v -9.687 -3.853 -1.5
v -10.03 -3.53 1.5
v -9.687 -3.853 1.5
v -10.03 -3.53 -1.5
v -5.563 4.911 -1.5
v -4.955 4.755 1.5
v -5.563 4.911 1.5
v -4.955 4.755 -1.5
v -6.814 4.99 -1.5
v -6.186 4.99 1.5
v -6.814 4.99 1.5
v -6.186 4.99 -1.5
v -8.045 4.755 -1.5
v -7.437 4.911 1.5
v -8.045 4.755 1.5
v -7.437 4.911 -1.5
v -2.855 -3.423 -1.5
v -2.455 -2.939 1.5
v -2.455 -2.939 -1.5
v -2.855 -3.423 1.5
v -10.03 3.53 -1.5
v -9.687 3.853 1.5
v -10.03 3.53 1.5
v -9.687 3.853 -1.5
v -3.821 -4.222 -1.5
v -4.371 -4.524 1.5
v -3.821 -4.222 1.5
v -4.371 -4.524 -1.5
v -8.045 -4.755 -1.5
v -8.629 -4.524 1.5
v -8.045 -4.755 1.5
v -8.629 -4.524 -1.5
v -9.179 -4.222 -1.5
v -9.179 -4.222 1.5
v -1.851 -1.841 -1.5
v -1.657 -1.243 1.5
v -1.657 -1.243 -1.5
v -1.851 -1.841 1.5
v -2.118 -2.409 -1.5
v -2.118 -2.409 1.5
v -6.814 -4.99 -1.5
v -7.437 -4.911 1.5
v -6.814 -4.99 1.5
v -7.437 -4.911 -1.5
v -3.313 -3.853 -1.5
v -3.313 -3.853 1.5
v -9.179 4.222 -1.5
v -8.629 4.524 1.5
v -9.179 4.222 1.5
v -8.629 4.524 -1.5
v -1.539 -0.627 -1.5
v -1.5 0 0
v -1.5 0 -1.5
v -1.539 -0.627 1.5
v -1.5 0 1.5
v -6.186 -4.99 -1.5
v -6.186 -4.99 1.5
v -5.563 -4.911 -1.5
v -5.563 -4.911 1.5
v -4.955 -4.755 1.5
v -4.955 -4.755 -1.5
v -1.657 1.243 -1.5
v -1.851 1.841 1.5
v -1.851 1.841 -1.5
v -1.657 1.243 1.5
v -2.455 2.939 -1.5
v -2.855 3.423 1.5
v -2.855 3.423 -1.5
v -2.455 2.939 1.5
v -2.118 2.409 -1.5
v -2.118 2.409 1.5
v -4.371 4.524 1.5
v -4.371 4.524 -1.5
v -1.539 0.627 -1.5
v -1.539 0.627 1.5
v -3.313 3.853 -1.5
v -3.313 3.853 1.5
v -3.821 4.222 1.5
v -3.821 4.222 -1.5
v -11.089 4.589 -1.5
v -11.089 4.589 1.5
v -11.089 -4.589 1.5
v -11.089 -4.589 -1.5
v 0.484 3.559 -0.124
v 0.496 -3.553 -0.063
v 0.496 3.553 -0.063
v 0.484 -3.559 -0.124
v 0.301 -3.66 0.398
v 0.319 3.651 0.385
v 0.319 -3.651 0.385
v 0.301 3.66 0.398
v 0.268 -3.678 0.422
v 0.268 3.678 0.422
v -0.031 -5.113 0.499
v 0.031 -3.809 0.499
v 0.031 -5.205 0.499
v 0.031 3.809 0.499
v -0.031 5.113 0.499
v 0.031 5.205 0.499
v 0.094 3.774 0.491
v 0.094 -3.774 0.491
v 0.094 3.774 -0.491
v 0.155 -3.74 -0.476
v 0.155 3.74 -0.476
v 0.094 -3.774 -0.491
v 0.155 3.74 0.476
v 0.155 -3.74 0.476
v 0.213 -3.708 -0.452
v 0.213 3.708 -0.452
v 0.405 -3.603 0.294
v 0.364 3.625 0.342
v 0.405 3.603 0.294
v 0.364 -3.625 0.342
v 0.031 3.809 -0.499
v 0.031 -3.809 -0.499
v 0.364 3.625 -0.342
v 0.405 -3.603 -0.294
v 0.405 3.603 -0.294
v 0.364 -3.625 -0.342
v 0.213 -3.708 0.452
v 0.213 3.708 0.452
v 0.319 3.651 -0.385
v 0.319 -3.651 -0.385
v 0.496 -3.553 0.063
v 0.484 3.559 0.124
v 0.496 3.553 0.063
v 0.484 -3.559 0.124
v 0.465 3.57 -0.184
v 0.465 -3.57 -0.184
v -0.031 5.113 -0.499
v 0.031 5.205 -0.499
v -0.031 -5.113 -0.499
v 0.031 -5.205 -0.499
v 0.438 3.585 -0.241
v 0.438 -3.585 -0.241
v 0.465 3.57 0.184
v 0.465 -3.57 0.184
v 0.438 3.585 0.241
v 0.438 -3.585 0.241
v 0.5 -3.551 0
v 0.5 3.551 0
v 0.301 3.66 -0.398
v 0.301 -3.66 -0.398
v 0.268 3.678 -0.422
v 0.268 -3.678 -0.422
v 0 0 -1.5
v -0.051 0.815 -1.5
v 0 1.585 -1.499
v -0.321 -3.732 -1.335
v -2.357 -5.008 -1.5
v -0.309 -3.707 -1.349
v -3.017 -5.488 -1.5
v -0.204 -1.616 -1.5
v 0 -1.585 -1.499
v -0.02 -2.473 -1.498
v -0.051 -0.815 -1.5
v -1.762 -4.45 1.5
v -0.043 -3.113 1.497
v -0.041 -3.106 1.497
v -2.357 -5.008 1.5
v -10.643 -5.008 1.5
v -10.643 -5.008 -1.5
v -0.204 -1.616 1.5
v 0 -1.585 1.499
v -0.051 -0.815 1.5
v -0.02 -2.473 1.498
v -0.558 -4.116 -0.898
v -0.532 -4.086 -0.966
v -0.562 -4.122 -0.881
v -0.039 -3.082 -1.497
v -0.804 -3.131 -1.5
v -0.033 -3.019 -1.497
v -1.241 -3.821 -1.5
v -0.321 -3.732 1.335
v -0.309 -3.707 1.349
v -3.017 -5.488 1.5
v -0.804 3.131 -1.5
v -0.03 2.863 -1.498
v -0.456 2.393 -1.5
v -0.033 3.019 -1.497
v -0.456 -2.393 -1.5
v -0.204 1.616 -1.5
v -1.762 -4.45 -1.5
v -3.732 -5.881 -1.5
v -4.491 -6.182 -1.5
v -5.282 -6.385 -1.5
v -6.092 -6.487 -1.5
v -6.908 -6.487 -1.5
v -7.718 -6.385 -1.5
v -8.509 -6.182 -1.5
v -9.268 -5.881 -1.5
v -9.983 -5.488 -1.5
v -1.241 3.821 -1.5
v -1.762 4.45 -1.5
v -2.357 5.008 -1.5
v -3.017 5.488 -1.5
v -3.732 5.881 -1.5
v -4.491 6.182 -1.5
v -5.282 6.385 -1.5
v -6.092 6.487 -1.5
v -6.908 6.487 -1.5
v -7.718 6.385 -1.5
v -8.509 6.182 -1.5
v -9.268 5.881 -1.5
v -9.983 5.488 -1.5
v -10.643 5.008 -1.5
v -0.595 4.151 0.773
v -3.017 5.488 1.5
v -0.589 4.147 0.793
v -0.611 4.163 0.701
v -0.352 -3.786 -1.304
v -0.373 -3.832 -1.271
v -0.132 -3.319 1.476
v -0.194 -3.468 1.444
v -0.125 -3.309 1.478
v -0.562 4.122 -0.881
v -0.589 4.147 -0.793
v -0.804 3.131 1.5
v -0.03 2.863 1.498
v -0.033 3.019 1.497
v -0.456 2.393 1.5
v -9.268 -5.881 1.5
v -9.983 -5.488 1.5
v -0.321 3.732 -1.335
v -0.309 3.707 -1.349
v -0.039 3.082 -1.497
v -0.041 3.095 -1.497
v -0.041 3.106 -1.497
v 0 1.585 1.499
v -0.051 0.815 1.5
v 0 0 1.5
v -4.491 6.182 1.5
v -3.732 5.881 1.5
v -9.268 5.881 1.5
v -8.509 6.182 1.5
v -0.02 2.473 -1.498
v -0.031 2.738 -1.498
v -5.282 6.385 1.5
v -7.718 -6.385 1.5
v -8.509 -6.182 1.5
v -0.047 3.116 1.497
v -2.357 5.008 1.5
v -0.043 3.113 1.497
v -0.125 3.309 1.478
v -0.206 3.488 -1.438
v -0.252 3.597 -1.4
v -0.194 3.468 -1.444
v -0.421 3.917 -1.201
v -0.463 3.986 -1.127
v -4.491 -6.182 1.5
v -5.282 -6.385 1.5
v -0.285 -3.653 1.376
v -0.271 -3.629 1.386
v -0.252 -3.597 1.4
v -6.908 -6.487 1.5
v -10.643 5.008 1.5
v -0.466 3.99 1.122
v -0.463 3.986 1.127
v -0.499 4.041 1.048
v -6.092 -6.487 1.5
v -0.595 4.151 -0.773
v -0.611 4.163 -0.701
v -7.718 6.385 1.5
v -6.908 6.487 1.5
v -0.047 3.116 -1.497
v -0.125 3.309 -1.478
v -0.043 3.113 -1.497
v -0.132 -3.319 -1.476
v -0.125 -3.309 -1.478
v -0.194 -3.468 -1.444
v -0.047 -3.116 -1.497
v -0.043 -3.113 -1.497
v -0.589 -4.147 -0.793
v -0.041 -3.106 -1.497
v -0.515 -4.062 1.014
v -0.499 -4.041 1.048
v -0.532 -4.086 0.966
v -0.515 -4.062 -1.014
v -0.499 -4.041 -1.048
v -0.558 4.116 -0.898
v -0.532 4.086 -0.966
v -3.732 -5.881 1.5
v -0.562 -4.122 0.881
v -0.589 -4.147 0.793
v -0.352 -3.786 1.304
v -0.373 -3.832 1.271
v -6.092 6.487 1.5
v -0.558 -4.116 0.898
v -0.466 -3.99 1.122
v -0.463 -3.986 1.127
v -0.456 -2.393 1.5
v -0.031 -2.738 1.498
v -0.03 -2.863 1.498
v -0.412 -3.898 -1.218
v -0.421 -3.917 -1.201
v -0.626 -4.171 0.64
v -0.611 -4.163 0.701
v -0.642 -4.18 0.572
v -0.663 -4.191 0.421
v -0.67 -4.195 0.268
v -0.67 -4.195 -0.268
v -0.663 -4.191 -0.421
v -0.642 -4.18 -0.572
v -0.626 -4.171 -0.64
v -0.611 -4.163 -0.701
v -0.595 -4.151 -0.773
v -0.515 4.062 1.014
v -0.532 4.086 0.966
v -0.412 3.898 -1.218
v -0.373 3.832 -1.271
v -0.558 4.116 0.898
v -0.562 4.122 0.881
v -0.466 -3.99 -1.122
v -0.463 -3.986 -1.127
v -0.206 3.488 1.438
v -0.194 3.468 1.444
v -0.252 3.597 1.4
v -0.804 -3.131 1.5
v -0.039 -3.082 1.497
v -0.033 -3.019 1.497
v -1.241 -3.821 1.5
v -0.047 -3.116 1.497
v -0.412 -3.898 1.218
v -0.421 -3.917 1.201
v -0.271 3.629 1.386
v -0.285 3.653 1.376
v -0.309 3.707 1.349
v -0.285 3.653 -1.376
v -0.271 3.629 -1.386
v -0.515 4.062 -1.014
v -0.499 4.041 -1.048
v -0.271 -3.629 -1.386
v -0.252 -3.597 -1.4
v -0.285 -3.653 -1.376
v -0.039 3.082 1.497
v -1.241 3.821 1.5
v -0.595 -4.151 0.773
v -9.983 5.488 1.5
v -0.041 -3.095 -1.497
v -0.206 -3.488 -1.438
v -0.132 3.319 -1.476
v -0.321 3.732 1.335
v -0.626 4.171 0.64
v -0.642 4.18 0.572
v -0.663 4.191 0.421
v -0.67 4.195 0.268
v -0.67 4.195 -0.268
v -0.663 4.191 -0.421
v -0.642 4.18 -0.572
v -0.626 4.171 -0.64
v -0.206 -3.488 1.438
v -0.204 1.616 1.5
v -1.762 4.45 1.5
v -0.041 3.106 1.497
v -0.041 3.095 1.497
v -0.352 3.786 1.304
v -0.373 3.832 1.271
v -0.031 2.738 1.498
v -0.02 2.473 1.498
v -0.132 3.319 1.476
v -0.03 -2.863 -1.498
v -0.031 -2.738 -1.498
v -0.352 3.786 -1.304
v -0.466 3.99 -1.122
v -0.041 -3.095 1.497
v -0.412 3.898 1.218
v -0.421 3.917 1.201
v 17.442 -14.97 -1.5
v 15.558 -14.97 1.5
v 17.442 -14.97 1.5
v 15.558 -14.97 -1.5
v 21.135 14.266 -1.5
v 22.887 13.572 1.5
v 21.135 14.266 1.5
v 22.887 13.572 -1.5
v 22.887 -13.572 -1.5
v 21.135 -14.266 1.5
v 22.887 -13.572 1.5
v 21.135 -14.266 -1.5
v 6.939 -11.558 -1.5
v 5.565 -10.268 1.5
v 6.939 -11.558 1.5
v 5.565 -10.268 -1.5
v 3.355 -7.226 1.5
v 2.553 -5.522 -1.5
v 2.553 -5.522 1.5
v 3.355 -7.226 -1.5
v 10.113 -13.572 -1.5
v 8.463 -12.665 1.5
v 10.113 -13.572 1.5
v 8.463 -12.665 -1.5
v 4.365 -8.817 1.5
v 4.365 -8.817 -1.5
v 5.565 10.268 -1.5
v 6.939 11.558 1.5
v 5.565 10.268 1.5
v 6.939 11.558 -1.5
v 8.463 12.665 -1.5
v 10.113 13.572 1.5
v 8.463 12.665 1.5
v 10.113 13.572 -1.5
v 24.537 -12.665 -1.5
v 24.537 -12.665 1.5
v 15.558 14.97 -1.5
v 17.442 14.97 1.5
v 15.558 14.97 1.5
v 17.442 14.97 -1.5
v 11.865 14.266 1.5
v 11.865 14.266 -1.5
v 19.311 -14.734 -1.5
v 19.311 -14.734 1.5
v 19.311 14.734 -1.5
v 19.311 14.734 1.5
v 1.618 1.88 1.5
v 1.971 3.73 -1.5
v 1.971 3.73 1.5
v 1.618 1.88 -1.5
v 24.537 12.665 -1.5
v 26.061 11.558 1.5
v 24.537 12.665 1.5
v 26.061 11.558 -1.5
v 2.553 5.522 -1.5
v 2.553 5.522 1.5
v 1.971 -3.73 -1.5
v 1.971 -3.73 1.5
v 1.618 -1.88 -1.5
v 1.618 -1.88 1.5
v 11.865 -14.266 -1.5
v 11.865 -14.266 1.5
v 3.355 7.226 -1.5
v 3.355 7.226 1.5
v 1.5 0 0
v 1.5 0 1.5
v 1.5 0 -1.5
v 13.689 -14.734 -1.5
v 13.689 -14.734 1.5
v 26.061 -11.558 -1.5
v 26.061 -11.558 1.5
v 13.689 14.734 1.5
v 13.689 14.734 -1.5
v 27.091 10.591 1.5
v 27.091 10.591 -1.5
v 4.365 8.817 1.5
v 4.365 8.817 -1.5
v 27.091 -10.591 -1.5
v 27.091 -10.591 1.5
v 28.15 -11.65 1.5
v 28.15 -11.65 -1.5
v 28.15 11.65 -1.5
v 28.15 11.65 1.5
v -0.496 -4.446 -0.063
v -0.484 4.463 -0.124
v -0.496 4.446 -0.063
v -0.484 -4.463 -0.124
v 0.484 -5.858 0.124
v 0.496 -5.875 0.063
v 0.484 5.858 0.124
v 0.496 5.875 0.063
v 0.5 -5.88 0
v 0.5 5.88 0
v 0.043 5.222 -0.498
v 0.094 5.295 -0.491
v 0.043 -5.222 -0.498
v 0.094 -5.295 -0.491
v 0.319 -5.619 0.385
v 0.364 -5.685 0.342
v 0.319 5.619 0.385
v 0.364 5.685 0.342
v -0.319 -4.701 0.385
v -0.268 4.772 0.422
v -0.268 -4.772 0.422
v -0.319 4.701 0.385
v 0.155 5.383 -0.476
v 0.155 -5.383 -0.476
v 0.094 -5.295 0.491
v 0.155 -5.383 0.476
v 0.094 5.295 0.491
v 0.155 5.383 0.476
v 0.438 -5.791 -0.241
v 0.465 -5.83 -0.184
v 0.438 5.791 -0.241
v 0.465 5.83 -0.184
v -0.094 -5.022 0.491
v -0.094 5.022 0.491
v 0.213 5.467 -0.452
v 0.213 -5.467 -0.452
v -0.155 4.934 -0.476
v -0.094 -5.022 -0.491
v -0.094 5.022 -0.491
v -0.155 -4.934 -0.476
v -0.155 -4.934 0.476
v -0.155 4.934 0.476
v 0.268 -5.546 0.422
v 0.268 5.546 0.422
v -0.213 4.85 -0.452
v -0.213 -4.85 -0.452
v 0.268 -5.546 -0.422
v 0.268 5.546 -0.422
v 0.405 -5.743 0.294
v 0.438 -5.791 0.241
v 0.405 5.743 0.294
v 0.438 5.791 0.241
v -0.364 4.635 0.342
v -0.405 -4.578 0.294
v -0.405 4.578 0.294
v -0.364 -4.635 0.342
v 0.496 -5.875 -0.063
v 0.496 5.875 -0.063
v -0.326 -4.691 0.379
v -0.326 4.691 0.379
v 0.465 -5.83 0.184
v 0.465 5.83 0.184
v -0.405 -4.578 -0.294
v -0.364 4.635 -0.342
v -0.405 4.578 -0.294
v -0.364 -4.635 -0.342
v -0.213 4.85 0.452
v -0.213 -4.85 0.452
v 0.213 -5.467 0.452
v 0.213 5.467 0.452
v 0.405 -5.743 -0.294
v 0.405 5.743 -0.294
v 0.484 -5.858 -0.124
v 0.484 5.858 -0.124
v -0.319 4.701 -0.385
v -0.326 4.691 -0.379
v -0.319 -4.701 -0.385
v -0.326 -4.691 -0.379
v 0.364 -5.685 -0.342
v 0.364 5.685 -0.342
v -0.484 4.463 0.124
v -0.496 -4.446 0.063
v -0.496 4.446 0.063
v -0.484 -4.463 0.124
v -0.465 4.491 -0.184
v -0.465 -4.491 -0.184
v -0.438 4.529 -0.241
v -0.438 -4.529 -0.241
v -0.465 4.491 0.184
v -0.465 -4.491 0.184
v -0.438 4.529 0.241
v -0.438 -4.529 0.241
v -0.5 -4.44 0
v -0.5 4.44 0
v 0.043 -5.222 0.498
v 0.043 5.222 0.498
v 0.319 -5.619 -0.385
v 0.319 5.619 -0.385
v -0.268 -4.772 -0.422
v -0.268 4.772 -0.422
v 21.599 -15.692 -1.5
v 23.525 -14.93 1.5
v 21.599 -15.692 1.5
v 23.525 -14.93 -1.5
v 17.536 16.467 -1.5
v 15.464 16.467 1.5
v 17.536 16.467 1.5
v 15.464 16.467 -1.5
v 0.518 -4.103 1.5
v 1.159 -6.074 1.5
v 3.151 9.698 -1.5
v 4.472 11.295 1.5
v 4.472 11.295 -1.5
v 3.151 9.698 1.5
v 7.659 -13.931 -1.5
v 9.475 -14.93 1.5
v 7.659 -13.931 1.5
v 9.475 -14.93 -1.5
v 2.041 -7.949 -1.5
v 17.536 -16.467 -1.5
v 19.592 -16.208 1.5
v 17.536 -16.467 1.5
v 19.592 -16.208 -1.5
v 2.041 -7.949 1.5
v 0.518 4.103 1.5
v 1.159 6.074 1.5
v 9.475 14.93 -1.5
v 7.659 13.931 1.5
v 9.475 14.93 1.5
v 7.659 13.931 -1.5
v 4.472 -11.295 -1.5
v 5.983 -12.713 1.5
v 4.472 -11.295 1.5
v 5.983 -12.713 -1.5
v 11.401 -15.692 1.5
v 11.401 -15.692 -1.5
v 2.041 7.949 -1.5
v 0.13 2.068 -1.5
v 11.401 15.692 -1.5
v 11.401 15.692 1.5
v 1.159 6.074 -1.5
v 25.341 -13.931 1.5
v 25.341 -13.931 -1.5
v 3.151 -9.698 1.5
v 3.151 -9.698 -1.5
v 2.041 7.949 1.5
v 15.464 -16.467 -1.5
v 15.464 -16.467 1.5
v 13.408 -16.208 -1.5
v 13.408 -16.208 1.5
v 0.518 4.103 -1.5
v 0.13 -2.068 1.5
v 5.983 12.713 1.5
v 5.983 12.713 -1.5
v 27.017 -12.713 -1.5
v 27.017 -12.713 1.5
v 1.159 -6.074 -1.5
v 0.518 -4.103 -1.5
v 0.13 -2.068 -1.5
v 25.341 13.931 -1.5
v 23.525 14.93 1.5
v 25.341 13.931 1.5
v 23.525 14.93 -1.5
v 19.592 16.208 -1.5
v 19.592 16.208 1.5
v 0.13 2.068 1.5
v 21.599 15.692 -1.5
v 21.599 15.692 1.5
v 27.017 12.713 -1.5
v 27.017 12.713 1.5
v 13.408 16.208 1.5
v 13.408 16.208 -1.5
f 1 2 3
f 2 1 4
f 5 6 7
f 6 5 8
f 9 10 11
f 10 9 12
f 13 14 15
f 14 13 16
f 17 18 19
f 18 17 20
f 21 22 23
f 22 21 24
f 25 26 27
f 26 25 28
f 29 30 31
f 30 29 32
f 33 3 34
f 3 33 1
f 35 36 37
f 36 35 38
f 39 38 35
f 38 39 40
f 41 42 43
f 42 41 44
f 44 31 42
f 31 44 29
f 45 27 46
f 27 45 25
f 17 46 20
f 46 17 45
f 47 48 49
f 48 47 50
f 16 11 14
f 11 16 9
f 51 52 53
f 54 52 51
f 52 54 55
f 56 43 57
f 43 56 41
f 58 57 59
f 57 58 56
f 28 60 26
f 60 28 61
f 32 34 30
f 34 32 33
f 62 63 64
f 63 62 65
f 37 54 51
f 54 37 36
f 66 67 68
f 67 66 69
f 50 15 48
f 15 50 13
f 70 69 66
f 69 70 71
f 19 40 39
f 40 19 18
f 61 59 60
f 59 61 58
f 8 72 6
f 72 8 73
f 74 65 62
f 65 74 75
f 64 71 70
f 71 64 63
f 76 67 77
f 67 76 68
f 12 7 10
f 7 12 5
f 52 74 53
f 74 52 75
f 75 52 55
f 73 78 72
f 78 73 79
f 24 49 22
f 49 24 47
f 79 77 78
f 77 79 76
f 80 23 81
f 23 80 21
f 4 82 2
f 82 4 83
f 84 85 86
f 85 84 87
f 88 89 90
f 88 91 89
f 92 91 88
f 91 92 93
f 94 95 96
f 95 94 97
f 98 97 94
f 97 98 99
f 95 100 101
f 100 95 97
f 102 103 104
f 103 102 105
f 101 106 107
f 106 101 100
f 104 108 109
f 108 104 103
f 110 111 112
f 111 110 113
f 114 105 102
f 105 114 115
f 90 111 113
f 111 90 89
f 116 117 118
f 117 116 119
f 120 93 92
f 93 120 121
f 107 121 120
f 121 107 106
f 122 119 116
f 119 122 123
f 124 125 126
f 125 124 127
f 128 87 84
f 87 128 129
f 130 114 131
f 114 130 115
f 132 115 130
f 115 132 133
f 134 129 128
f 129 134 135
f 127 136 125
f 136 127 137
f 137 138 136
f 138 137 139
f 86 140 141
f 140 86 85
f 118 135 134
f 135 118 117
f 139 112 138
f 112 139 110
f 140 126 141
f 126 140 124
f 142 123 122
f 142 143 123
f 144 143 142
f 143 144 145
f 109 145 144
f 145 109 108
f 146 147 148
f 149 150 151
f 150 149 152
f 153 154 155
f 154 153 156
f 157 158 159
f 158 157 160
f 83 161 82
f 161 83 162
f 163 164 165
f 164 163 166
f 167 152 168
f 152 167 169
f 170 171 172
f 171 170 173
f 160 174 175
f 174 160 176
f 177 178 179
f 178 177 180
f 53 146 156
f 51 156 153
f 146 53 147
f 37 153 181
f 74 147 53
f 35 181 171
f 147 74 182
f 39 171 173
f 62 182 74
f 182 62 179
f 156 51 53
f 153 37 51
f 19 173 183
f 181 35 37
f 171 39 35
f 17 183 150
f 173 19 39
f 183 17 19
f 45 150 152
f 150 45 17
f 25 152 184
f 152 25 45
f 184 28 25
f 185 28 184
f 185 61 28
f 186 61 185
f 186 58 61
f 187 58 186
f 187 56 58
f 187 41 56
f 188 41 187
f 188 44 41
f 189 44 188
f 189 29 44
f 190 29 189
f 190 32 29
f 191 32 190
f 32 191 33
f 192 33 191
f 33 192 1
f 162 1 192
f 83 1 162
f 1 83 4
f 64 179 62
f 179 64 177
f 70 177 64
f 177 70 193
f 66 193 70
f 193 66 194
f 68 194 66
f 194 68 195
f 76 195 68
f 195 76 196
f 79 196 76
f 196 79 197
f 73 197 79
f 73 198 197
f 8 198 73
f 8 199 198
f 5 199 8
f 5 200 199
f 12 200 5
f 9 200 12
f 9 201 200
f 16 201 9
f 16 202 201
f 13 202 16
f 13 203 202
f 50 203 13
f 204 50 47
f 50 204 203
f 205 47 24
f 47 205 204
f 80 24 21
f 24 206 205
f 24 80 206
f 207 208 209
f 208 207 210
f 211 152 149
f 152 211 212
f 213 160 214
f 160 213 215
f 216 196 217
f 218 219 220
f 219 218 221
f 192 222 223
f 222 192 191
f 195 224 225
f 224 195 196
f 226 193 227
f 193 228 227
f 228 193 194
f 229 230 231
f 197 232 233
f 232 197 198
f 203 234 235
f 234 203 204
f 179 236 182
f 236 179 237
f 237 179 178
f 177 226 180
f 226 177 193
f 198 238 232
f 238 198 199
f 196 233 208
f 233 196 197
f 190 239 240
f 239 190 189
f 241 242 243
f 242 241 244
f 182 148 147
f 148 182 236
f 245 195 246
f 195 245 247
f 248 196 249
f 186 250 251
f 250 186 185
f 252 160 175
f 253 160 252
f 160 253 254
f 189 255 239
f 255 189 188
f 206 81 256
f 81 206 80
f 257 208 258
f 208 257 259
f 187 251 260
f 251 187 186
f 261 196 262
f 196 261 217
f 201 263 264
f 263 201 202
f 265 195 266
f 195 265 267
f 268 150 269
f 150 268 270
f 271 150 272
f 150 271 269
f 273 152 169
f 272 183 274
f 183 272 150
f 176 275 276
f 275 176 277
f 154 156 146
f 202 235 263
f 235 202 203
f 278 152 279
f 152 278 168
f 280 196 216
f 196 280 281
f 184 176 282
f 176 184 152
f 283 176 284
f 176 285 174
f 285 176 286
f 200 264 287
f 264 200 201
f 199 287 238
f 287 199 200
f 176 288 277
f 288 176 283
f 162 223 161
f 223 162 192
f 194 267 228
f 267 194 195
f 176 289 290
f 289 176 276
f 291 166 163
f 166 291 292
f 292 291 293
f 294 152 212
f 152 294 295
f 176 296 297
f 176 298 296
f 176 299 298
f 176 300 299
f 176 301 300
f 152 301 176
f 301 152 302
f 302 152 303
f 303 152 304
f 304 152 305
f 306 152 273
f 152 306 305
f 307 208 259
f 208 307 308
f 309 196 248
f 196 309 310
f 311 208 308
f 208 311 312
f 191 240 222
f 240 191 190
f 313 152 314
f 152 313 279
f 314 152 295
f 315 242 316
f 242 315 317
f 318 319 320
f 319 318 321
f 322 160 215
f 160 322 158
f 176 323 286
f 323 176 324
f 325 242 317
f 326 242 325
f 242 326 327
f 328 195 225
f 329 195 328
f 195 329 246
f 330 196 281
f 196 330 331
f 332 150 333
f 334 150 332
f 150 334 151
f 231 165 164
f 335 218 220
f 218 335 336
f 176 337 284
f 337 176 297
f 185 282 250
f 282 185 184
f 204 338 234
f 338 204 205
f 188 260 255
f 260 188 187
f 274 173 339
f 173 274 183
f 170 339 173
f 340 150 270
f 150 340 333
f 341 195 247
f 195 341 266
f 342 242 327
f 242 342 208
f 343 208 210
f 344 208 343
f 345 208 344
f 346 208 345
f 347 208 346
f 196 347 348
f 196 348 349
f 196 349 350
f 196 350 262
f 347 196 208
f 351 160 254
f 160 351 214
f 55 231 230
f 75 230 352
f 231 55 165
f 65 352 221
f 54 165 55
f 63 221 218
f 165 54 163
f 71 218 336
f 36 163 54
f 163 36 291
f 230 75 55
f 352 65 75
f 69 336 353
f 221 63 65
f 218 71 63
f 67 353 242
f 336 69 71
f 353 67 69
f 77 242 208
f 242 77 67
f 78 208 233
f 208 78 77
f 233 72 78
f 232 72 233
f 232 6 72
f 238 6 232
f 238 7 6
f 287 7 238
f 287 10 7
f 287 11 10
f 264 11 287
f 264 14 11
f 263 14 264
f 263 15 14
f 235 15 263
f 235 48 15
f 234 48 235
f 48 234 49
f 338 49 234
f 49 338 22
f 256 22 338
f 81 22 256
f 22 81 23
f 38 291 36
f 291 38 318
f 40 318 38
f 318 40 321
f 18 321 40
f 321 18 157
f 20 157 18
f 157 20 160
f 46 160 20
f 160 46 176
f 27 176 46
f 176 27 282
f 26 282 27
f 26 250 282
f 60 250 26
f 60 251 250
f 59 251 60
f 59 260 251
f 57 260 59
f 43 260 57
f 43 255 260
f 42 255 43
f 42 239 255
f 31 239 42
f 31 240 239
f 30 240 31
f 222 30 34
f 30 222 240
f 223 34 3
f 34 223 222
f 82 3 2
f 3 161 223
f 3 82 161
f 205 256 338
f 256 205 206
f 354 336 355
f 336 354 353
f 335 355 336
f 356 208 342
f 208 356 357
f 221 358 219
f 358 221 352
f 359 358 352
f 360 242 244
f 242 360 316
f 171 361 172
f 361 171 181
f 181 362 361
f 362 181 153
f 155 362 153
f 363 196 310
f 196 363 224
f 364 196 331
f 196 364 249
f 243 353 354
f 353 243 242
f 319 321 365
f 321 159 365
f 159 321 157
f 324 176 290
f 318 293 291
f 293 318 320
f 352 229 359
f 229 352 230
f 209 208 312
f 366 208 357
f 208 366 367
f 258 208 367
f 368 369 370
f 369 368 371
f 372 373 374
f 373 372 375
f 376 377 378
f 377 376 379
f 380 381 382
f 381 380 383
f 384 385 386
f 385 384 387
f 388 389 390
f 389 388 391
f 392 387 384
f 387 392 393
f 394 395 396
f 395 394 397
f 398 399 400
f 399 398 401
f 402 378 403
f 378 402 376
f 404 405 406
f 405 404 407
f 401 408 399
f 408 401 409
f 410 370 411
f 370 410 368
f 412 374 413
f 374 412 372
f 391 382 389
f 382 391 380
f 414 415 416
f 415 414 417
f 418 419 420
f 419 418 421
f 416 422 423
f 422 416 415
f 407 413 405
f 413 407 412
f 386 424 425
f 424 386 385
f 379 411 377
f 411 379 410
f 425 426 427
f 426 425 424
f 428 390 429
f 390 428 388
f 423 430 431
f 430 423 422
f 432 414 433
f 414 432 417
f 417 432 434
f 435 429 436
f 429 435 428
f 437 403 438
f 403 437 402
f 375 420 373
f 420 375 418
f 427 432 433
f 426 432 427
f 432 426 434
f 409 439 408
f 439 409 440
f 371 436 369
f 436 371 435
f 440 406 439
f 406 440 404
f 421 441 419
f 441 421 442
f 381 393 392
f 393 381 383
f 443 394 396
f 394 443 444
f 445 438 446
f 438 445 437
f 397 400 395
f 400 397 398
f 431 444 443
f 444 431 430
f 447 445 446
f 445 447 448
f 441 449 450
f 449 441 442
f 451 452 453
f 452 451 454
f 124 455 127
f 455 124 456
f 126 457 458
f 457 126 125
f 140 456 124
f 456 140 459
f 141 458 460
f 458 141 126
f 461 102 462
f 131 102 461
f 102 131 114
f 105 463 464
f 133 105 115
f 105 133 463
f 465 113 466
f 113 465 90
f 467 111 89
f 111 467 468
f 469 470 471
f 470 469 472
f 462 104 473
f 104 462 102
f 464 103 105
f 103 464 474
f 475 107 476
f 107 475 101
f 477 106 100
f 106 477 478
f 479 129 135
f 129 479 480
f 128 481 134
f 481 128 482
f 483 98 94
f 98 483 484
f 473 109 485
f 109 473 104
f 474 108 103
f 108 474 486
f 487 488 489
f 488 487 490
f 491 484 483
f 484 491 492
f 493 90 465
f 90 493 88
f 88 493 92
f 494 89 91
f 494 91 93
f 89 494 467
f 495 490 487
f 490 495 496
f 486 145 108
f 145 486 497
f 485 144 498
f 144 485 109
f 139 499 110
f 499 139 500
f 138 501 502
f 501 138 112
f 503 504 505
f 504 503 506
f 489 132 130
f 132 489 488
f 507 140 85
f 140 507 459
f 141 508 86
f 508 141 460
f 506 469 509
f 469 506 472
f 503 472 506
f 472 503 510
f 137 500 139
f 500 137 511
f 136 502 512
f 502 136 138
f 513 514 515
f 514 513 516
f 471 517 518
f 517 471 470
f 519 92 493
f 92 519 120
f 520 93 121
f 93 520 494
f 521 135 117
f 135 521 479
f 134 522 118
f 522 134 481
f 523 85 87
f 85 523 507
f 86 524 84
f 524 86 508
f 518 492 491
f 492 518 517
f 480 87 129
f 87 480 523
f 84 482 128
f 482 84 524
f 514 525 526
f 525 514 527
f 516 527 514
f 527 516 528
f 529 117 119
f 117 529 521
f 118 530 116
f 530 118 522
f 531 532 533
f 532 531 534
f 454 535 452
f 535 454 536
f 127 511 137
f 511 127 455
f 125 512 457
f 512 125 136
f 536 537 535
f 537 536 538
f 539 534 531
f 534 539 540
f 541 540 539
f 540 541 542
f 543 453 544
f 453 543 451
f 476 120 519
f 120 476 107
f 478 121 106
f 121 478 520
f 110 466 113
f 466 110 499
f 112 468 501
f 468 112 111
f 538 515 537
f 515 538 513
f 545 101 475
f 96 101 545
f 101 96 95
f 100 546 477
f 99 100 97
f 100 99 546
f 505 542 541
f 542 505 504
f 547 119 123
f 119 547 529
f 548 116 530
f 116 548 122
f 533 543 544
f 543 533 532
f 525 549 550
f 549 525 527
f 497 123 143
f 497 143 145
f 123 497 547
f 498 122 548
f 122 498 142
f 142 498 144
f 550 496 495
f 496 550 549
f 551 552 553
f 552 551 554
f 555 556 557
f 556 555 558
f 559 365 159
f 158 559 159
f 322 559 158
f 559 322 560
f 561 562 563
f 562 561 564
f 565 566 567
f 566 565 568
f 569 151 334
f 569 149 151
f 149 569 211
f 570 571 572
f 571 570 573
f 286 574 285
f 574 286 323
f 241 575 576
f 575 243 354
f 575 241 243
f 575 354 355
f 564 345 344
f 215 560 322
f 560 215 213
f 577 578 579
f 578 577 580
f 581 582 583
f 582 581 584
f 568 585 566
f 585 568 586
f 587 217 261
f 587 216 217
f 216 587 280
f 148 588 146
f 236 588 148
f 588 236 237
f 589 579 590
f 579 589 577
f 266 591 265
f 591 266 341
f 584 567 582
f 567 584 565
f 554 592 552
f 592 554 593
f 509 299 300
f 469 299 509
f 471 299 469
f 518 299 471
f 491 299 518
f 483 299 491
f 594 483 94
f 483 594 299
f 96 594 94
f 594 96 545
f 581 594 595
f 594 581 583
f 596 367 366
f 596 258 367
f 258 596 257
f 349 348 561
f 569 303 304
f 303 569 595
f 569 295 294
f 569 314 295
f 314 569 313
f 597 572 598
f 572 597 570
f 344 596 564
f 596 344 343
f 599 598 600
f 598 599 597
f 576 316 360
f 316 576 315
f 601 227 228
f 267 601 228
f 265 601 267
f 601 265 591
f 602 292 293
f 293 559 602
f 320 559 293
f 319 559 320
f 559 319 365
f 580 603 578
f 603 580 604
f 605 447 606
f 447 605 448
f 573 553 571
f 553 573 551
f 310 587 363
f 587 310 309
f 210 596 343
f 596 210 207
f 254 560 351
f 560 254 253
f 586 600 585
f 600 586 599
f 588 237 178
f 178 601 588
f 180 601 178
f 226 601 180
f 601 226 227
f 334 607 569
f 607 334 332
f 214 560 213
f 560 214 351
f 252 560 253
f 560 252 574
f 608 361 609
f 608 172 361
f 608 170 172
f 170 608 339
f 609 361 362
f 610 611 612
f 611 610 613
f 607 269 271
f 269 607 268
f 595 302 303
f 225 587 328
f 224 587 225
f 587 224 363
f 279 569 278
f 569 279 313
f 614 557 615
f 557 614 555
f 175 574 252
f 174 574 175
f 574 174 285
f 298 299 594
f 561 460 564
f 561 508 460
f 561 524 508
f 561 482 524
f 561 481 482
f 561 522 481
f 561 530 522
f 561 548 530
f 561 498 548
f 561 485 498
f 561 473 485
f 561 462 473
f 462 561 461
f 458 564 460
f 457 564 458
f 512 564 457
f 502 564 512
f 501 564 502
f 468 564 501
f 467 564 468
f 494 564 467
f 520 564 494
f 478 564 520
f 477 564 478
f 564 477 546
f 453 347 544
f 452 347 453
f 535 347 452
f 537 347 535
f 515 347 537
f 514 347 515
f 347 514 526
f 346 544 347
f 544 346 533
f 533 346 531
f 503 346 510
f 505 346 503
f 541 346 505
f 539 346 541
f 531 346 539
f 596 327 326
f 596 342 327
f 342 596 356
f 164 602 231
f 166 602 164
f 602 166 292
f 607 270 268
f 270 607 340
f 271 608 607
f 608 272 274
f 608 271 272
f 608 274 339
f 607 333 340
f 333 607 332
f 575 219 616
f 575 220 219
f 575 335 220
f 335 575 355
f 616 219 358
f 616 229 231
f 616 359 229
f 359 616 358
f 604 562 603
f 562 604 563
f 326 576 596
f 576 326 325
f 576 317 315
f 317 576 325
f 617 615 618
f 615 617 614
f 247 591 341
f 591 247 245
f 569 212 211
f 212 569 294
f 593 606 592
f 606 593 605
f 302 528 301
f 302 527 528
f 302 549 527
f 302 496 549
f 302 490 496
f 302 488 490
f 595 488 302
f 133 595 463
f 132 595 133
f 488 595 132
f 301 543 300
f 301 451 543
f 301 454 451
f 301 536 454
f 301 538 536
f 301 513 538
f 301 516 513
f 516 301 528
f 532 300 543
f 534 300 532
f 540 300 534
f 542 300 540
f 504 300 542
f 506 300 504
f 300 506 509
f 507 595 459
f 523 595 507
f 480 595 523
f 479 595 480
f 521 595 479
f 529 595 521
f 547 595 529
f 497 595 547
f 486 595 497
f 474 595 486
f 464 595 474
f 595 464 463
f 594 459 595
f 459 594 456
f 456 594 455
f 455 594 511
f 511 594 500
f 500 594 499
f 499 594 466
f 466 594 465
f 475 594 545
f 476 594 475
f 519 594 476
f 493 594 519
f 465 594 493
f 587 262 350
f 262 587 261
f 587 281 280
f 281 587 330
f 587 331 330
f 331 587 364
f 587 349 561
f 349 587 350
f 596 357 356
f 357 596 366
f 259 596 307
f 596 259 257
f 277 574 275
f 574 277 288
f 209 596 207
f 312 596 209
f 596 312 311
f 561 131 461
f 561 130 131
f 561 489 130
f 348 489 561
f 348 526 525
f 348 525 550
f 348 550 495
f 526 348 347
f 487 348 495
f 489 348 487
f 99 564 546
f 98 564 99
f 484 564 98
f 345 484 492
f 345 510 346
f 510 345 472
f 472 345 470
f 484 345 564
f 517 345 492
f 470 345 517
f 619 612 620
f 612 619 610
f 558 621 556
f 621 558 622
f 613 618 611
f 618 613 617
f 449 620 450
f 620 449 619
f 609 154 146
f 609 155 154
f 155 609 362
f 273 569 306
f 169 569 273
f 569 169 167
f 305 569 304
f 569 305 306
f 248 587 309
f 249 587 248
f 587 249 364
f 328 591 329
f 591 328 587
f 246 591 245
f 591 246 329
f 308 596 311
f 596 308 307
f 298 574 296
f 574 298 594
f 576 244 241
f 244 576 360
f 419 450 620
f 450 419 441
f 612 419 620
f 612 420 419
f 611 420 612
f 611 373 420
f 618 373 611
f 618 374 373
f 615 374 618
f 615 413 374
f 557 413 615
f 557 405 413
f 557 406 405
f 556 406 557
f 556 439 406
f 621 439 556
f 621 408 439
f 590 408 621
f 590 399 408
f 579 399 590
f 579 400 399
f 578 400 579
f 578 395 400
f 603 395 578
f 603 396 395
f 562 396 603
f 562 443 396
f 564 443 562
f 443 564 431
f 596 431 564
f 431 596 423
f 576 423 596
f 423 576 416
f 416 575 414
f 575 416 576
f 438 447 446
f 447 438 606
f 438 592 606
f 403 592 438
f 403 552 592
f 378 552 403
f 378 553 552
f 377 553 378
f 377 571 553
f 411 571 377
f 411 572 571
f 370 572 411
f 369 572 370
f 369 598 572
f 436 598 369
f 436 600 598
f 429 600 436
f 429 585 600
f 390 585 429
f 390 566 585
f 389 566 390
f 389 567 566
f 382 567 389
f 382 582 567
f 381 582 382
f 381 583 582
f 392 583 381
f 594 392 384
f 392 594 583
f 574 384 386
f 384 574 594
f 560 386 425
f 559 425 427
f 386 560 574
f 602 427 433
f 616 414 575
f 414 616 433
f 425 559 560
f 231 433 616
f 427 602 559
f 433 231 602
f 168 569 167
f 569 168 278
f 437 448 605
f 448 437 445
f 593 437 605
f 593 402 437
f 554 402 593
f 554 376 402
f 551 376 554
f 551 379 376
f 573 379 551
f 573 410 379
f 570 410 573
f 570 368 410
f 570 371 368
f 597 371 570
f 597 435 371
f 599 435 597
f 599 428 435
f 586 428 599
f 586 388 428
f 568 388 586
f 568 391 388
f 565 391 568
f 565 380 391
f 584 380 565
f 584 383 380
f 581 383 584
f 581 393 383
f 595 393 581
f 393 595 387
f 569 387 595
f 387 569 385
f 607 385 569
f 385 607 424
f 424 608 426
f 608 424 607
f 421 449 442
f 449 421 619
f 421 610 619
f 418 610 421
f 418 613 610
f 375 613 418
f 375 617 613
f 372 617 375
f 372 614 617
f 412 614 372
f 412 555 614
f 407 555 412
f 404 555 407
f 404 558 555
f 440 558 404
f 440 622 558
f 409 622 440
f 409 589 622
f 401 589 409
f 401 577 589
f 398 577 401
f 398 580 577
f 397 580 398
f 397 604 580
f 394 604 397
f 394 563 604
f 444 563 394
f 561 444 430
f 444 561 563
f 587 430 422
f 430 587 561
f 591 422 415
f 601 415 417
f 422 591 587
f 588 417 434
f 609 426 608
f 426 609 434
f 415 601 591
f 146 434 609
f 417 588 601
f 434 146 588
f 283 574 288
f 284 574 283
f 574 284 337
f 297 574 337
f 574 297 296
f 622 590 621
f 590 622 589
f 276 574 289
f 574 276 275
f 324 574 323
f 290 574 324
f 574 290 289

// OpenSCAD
//+-------------------------------------------------+
//|  OPENSCAD double pipe clamp - c0c0chane1 clamp  |
//|        2015 gaziel@gmail.com                    |
//+- -----------------------------------------------+   
   
// Diameter for the first Pipe
dp1= 30;
// Diameter for the first Pipe
dp2= 10;
//Thinkness=5;
ep=3;

//hole for colson, rilsan or hose clamp
dh=1;//hole diameter for the hose clamp, "0" for no-hole.
$fn=50;

orientation=0;//Orientation in degree (zero for straight)

translate([-(dp2+ep)/2,0,0])rotate([0,0,180])ring(dp2,0);
translate([(dp1+ep)/2,0,0])ring(dp1,orientation);

module ring(dp,or){;
    difference(){
        hull(){
            rotate([or,0,0])cylinder(d=dp+ep,h=ep, center=true);
            translate([-(dp+ep)/2,0,0])rotate([90,0,0])cylinder(d=ep,h=2*ep, center=true);
        }
        rotate([or,0,0]){
        union(){
            cylinder(d=dp,h=dp, center=true);
            rotate([0,0,225]) translate([-dp,0,-dp*3])cube([dp,dp,6*dp]);
            translate([-(dp+ep)/2,0,0])rotate([90,0,0])cylinder(d=dh,h=3*ep, center=true);    
            }
        }
        translate([-(dp+ep)/2,0,0])rotate([90,0,0])cylinder(d=dh,h=dp*ep, center=true);   
    }
}
